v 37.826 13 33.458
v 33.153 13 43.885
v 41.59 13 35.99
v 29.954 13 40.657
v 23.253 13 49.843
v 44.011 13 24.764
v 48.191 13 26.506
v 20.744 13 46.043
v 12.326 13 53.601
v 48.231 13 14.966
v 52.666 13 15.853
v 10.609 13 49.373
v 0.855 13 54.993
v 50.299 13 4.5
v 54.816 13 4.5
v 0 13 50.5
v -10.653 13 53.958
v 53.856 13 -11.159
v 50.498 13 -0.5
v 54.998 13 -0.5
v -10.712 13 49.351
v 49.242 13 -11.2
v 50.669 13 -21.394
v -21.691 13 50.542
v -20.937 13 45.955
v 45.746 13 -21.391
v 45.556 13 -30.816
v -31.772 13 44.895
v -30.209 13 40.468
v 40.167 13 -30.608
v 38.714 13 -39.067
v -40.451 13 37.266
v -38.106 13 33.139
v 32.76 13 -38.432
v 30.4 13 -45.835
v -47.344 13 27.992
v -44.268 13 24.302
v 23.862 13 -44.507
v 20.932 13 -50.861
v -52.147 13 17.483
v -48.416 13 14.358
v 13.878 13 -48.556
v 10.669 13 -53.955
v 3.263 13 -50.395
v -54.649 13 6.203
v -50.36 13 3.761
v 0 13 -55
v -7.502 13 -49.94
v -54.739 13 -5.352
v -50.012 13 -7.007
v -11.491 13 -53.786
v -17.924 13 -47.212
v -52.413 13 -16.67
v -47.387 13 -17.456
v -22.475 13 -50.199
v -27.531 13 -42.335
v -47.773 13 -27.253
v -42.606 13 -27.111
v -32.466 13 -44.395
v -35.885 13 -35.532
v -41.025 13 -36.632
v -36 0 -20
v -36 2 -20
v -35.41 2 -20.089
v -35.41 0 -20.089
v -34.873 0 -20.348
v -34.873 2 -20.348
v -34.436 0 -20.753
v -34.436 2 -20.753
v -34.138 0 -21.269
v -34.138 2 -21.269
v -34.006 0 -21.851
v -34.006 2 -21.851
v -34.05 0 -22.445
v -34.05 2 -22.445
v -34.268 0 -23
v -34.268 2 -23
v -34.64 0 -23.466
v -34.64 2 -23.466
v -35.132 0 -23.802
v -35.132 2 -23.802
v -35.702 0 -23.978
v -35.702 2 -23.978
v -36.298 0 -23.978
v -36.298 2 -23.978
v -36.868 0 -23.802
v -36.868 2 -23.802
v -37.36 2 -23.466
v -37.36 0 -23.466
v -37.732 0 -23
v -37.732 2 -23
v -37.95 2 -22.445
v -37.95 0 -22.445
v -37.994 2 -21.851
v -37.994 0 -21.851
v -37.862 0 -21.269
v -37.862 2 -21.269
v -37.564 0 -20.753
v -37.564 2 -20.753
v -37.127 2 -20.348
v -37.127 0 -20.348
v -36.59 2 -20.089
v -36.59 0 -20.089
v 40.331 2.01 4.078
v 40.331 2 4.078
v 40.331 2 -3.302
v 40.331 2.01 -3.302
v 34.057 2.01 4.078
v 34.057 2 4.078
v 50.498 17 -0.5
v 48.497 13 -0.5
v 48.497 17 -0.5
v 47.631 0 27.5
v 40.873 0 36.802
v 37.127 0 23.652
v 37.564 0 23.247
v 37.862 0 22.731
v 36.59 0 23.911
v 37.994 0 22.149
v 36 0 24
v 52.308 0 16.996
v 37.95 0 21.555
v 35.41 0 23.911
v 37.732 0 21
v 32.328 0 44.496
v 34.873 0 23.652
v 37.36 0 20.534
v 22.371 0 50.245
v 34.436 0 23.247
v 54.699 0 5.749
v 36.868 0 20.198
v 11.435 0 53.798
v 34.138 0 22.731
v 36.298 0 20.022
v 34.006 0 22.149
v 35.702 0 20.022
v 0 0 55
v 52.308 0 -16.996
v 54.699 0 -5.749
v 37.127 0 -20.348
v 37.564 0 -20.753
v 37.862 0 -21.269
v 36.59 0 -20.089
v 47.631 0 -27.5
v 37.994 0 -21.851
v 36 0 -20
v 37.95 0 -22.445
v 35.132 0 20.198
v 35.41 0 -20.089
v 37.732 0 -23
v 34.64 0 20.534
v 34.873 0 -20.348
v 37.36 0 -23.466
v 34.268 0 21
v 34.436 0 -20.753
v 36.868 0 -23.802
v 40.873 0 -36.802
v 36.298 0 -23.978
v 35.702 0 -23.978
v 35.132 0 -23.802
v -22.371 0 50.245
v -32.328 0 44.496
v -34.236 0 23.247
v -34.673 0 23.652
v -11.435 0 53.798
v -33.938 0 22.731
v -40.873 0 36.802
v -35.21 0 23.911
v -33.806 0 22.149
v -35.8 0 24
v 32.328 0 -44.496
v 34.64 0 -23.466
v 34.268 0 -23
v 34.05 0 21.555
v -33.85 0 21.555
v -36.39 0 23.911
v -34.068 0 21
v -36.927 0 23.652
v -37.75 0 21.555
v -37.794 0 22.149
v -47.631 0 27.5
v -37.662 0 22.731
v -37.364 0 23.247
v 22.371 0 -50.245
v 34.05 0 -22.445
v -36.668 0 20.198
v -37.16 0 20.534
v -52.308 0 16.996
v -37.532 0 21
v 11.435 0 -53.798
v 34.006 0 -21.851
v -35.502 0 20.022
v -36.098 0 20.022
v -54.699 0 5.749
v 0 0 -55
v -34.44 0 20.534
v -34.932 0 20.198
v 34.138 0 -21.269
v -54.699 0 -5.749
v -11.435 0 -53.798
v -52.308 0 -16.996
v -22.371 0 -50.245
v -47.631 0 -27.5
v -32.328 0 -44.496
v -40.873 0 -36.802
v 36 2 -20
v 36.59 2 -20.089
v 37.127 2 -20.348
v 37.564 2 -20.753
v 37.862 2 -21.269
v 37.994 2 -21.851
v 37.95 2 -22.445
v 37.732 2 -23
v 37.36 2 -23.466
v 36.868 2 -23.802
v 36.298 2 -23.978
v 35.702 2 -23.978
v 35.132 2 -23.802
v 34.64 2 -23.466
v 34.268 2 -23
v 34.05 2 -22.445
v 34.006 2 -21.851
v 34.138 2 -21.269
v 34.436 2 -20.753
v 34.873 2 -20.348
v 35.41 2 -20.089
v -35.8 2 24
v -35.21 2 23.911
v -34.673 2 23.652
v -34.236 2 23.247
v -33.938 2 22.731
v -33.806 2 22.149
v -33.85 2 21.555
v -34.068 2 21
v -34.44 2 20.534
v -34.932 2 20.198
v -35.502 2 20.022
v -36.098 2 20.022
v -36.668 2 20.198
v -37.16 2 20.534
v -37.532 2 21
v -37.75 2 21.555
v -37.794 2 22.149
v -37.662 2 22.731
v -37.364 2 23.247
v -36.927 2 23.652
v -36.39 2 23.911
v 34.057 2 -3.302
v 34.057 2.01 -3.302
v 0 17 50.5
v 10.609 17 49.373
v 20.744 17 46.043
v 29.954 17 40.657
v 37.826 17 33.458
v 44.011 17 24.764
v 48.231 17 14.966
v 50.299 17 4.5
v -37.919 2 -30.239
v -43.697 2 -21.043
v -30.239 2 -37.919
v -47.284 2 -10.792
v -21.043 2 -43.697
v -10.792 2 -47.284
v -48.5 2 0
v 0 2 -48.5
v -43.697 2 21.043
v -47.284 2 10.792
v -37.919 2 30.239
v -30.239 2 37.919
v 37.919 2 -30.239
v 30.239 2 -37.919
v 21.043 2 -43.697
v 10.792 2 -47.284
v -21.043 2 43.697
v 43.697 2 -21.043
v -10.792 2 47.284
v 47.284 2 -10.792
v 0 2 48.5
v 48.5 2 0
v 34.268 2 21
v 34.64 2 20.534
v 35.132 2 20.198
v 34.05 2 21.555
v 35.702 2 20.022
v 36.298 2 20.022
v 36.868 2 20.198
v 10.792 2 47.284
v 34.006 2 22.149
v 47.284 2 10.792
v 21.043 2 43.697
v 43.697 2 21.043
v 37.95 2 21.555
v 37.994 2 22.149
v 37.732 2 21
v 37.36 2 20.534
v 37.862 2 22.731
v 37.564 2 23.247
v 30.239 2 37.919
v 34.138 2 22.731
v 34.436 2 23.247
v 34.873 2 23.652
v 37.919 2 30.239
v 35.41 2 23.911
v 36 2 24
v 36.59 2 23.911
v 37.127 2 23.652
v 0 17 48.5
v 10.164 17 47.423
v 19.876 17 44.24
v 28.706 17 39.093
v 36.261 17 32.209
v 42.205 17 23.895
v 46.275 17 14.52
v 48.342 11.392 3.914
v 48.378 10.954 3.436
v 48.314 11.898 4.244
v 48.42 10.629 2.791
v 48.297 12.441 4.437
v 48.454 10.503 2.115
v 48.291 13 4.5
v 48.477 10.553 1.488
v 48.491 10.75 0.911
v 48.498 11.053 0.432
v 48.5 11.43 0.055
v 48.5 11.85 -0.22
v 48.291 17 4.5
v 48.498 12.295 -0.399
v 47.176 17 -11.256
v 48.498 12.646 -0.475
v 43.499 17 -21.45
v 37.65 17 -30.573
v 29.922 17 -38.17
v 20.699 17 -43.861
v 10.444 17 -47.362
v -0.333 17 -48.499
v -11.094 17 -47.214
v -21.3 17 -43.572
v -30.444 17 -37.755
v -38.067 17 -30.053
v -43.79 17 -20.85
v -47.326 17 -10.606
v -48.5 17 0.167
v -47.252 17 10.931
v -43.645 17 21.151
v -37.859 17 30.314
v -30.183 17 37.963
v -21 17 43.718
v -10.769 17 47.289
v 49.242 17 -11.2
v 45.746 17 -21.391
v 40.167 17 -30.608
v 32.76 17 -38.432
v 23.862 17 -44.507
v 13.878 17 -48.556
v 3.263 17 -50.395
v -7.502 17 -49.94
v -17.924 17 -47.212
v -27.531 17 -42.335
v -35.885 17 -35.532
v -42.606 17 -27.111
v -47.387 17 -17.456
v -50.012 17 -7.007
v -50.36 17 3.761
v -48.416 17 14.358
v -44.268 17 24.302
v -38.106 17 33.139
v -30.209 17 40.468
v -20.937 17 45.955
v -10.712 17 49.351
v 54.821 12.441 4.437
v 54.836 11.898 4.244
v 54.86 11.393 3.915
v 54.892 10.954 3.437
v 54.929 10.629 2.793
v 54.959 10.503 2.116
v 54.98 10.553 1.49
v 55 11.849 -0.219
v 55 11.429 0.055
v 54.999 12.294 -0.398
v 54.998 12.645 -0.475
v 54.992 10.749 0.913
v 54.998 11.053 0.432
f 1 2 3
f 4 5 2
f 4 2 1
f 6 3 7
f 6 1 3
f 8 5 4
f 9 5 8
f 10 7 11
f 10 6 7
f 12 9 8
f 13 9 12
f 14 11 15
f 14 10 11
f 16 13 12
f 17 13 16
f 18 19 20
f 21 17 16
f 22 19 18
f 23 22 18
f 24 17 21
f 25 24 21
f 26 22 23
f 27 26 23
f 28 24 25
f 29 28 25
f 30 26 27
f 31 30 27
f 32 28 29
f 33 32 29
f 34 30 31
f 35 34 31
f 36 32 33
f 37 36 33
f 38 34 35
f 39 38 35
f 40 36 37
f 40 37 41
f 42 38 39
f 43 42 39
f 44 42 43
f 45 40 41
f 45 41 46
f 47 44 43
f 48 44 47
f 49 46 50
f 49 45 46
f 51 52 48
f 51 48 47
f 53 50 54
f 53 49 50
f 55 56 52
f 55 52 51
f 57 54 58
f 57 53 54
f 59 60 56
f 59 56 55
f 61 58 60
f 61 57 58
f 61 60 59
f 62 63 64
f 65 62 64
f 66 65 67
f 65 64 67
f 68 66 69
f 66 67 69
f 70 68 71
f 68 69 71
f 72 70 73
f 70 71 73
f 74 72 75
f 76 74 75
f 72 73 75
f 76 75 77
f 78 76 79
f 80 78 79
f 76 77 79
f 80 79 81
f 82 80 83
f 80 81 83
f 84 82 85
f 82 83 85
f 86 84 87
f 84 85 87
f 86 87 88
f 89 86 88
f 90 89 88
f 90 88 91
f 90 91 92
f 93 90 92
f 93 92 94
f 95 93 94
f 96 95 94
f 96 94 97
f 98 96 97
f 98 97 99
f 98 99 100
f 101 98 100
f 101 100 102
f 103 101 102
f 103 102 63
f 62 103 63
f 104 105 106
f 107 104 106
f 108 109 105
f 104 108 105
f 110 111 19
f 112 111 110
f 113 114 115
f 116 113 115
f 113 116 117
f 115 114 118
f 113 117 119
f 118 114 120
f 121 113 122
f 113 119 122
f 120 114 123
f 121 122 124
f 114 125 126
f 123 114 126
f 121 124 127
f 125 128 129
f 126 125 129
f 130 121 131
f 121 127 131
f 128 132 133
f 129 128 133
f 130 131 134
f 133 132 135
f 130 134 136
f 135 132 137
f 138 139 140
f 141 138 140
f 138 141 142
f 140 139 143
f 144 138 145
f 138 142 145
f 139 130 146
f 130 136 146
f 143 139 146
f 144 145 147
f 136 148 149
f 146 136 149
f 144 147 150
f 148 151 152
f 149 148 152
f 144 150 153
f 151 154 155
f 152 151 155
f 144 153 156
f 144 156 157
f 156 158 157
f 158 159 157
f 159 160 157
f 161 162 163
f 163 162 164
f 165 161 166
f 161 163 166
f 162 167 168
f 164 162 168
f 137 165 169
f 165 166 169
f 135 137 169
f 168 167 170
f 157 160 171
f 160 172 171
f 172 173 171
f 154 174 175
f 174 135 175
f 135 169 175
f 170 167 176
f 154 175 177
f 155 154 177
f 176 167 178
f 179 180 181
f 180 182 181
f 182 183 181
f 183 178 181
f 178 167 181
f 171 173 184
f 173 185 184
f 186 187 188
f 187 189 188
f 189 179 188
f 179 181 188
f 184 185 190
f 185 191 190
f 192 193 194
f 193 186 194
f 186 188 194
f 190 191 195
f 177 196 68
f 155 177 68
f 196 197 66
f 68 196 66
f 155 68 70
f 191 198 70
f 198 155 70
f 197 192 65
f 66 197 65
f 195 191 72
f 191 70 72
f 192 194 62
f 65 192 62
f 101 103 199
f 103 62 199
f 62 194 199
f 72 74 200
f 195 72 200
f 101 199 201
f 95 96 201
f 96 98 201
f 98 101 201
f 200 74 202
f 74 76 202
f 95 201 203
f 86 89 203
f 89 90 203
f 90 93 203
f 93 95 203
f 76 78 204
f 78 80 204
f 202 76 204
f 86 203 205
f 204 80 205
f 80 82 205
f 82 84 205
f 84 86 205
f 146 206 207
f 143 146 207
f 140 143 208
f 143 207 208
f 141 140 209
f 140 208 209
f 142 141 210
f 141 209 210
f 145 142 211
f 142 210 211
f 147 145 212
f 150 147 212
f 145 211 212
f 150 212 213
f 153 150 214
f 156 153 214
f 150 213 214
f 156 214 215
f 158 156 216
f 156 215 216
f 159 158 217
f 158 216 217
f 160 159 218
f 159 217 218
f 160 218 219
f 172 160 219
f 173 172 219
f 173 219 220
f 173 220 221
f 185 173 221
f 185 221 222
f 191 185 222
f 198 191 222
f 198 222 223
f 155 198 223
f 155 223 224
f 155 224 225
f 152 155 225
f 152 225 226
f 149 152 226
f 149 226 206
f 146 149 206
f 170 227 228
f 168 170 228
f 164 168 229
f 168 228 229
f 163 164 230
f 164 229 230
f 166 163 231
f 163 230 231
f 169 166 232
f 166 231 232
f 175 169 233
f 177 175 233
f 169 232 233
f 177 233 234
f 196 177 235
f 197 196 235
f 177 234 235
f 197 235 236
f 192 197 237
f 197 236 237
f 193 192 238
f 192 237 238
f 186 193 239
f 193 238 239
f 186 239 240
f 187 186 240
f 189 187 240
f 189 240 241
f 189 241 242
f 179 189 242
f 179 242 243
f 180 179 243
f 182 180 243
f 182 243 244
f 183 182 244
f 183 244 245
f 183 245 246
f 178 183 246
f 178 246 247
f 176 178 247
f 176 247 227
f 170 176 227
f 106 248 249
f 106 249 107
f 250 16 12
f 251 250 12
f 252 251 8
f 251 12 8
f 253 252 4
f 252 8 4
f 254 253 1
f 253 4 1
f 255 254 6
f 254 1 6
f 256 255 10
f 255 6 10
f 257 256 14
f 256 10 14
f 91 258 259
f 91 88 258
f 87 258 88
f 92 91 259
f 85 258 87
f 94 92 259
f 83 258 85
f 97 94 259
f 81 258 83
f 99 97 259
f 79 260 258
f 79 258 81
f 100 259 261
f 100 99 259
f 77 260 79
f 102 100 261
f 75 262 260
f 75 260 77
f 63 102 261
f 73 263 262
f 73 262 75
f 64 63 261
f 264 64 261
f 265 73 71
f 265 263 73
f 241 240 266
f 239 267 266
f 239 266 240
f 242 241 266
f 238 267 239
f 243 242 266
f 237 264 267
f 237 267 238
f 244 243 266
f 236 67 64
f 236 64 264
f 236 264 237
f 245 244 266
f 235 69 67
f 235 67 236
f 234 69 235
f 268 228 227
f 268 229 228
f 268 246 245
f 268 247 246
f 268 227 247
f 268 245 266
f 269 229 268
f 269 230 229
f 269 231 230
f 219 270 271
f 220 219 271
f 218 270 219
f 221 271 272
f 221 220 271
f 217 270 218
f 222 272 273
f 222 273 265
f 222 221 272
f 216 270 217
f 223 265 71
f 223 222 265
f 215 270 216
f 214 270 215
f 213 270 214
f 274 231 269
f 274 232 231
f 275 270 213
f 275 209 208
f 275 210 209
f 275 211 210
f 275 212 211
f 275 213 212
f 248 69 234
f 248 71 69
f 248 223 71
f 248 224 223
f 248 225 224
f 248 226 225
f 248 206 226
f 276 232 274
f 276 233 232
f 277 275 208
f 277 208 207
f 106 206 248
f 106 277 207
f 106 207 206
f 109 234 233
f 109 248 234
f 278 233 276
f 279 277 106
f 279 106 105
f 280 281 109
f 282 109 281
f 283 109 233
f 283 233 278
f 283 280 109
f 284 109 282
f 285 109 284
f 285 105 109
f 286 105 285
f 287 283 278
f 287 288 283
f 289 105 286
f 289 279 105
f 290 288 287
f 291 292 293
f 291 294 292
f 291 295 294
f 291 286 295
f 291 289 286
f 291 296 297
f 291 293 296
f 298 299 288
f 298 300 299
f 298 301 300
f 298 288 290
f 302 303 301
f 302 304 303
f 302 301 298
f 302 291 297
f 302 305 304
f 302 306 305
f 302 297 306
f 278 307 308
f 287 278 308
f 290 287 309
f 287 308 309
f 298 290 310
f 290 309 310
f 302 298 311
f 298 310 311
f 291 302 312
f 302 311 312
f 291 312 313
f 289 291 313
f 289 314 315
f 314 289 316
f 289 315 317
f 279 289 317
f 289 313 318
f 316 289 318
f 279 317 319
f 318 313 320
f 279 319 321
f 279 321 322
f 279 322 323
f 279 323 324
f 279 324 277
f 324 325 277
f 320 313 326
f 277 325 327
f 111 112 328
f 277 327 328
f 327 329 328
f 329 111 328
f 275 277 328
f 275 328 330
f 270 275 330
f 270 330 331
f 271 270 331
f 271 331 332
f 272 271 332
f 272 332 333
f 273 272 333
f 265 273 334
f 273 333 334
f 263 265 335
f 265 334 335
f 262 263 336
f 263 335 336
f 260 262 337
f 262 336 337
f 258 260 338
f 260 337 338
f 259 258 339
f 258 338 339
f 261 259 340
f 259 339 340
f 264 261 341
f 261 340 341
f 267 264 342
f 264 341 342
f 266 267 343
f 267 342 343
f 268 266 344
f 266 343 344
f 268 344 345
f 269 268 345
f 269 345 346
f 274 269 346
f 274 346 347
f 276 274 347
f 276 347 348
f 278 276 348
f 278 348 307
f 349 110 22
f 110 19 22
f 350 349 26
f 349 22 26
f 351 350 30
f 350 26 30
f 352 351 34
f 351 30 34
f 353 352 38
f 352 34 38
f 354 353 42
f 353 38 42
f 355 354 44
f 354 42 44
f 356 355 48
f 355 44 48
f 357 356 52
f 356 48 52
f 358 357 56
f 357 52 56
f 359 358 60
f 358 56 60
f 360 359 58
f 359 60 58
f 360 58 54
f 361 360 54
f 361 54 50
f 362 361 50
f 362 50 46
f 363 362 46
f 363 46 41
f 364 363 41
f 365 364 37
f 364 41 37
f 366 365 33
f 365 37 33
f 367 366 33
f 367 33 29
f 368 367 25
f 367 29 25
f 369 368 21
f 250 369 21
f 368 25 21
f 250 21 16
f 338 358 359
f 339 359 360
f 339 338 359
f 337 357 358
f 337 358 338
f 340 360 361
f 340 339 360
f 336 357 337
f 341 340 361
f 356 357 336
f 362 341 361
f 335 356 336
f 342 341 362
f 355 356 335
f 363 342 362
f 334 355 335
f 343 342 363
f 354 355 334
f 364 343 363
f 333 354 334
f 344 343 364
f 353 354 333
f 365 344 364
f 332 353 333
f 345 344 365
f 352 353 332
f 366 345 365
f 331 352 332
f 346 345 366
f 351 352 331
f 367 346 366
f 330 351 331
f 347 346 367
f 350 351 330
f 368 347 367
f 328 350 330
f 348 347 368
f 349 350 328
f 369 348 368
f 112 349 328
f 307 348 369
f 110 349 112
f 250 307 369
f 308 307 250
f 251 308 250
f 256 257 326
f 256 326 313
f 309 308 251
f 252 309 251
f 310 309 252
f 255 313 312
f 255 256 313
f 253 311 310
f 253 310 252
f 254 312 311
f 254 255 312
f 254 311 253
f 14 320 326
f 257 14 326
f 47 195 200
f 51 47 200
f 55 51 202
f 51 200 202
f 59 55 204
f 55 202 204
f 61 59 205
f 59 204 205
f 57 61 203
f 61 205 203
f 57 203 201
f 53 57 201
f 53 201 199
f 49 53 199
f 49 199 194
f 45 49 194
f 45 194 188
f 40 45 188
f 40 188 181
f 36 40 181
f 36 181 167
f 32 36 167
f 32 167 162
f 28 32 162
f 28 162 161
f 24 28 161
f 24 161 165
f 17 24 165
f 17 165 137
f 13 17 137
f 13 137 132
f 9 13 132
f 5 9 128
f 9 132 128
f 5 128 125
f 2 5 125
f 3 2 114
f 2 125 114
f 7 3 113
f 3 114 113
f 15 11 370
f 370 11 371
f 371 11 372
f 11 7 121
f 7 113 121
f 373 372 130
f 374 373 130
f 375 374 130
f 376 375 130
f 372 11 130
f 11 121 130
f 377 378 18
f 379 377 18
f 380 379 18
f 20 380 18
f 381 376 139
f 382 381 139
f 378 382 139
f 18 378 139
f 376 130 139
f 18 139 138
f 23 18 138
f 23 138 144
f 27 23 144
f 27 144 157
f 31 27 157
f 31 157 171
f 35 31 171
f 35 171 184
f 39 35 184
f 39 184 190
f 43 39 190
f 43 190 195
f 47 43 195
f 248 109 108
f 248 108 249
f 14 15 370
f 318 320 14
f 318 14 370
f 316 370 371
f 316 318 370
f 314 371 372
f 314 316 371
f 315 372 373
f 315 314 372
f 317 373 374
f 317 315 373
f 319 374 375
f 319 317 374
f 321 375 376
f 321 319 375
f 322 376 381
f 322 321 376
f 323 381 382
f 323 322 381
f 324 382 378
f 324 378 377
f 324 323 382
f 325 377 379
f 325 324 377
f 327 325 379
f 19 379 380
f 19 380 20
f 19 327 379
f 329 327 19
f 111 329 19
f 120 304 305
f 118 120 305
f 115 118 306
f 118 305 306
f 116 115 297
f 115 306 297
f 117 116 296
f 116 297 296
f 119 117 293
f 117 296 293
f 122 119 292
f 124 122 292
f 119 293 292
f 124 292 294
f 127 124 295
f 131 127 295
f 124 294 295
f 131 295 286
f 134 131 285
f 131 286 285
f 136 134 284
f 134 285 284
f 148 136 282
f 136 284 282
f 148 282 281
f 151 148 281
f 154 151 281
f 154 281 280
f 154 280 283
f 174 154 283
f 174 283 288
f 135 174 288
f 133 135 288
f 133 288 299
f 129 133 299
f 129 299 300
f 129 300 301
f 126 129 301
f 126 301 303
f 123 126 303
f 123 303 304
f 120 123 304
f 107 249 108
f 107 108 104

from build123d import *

# Parameters (mm, degrees)
SKETCH2_R                = 55
BOSS_EXTRUDE2_DEPTH      = 13
SKETCH7_R                = 50.5
BOSS_EXTRUDE3_DEPTH      = 4
SKETCH8_R                = 48.5
CUT_EXTRUDE3_DEPTH       = 15
SKETCH9_R                = 2
SKETCH9_W                = 3.162660916
SKETCH9_H                = 2.60493009
CUT_EXTRUDE4_DEPTH       = 15
CUT_EXTRUDE5_DEPTH       = 20
CUT_EXTRUDE5_DEPTH_BACK  = 1
SKETCH10_R               = 2.5
BOSS_EXTRUDE5_DEPTH      = 0.01
BOSS_EXTRUDE5_DEPTH_BACK = 2
SKETCH11_W               = 6.274273212
SKETCH11_H               = 7.379534018
CUT_EXTRUDE6_REACH       = 81.618
CUT_EXTRUDE6_END_RADIUS  = 50.5
SKETCH13_W               = 5
SKETCH13_H               = 6.11505402


with BuildPart() as part:
    # Sketch2 → Boss-Extrude2 (new body)
    with BuildSketch(Plane(origin=(0, 0, 0), x_dir=(1, 0, 0), z_dir=(0, 1, 0))):
        with Locations(Location((0, 0, 0), (0, 0, 90))):
            Circle(SKETCH2_R)
    extrude(amount=BOSS_EXTRUDE2_DEPTH)

    # Sketch7 → Boss-Extrude3 (add)
    with BuildSketch(Plane(origin=(0, 13, 0), x_dir=(1, 0, 0), z_dir=(0, 1, 0))):
        with Locations(Location((0, 0, 0), (0, 0, 270))):
            Circle(SKETCH7_R)
    extrude(amount=BOSS_EXTRUDE3_DEPTH)

    # Sketch8 → Cut-Extrude3 (cut)
    with BuildSketch(Plane(origin=(0, 17, 0), x_dir=(1, 0, 0), z_dir=(0, 1, 0))):
        with Locations(Location((0, 0, 0), (0, 0, 270))):
            Circle(SKETCH8_R)
    extrude(amount=-CUT_EXTRUDE3_DEPTH, mode=Mode.SUBTRACT)

    # Sketch9 → Cut-Extrude4 (cut)
    with BuildSketch(Plane(origin=(0, 2, 0), x_dir=(1, 0, 0), z_dir=(0, 1, 0))):
        with Locations(Location((36, -22, 0), (0, 0, 270))):
            Circle(SKETCH9_R)
        with Locations(Location((-36, 22, 0), (0, 0, 270))):
            Circle(SKETCH9_R)
        with Locations(Location((-35.8, -22, 0), (0, 0, 270))):
            Circle(SKETCH9_R)
        with Locations(Location((36, 22, 0), (0, 0, 270))):
            Circle(SKETCH9_R)
        with Locations((37.581330458, -0.802465045)):
            Rectangle(SKETCH9_W, SKETCH9_H)
    extrude(amount=-CUT_EXTRUDE4_DEPTH, mode=Mode.SUBTRACT)

    # Sketch10 → Cut-Extrude5 (cut, two sides: drawn at the far end of the back side and taken through both)
    with BuildSketch(Plane(origin=(36, 0, 0), x_dir=(0, 0, -1), z_dir=(1, 0, 0)).offset(-CUT_EXTRUDE5_DEPTH_BACK)):
        with Locations(Location((-2, 13, 0), (0, 0, 180))):
            Circle(SKETCH10_R)
    extrude(amount=CUT_EXTRUDE5_DEPTH + CUT_EXTRUDE5_DEPTH_BACK, mode=Mode.SUBTRACT)

    # Sketch11 → Boss-Extrude5 (add, two sides: drawn at the far end of the back side and taken through both)
    with BuildSketch(Plane(origin=(0, 2, 0), x_dir=(1, 0, 0), z_dir=(0, 1, 0)).offset(-BOSS_EXTRUDE5_DEPTH_BACK)):
        with Locations((37.193701051, -0.388212482)):
            Rectangle(SKETCH11_W, SKETCH11_H)
    extrude(amount=BOSS_EXTRUDE5_DEPTH + BOSS_EXTRUDE5_DEPTH_BACK)

    # Cut-Extrude6: up to this cylinder (the profile starts inside it)
    cut_extrude6_end = Plane(origin=(0, 16.057527, 0), z_dir=(0, -1, 0)) * Cylinder(CUT_EXTRUDE6_END_RADIUS, 265.236, mode=Mode.PRIVATE)
    # Sketch13 → Cut-Extrude6 (cut, up to the surface)
    with BuildSketch(Plane(origin=(0, 0, 0), x_dir=(0, 0, -1), z_dir=(1, 0, 0)), mode=Mode.PRIVATE) as cut_extrude6_sk1:
        with Locations((-2, 16.05752701)):
            Rectangle(SKETCH13_W, SKETCH13_H)
    cut_extrude6_tool1 = extrude(cut_extrude6_sk1.sketch, amount=CUT_EXTRUDE6_REACH, mode=Mode.PRIVATE) & cut_extrude6_end
    add(cut_extrude6_tool1.solids().sort_by_distance((0, 16.057527, 2))[0], mode=Mode.SUBTRACT)


solid = part.part
